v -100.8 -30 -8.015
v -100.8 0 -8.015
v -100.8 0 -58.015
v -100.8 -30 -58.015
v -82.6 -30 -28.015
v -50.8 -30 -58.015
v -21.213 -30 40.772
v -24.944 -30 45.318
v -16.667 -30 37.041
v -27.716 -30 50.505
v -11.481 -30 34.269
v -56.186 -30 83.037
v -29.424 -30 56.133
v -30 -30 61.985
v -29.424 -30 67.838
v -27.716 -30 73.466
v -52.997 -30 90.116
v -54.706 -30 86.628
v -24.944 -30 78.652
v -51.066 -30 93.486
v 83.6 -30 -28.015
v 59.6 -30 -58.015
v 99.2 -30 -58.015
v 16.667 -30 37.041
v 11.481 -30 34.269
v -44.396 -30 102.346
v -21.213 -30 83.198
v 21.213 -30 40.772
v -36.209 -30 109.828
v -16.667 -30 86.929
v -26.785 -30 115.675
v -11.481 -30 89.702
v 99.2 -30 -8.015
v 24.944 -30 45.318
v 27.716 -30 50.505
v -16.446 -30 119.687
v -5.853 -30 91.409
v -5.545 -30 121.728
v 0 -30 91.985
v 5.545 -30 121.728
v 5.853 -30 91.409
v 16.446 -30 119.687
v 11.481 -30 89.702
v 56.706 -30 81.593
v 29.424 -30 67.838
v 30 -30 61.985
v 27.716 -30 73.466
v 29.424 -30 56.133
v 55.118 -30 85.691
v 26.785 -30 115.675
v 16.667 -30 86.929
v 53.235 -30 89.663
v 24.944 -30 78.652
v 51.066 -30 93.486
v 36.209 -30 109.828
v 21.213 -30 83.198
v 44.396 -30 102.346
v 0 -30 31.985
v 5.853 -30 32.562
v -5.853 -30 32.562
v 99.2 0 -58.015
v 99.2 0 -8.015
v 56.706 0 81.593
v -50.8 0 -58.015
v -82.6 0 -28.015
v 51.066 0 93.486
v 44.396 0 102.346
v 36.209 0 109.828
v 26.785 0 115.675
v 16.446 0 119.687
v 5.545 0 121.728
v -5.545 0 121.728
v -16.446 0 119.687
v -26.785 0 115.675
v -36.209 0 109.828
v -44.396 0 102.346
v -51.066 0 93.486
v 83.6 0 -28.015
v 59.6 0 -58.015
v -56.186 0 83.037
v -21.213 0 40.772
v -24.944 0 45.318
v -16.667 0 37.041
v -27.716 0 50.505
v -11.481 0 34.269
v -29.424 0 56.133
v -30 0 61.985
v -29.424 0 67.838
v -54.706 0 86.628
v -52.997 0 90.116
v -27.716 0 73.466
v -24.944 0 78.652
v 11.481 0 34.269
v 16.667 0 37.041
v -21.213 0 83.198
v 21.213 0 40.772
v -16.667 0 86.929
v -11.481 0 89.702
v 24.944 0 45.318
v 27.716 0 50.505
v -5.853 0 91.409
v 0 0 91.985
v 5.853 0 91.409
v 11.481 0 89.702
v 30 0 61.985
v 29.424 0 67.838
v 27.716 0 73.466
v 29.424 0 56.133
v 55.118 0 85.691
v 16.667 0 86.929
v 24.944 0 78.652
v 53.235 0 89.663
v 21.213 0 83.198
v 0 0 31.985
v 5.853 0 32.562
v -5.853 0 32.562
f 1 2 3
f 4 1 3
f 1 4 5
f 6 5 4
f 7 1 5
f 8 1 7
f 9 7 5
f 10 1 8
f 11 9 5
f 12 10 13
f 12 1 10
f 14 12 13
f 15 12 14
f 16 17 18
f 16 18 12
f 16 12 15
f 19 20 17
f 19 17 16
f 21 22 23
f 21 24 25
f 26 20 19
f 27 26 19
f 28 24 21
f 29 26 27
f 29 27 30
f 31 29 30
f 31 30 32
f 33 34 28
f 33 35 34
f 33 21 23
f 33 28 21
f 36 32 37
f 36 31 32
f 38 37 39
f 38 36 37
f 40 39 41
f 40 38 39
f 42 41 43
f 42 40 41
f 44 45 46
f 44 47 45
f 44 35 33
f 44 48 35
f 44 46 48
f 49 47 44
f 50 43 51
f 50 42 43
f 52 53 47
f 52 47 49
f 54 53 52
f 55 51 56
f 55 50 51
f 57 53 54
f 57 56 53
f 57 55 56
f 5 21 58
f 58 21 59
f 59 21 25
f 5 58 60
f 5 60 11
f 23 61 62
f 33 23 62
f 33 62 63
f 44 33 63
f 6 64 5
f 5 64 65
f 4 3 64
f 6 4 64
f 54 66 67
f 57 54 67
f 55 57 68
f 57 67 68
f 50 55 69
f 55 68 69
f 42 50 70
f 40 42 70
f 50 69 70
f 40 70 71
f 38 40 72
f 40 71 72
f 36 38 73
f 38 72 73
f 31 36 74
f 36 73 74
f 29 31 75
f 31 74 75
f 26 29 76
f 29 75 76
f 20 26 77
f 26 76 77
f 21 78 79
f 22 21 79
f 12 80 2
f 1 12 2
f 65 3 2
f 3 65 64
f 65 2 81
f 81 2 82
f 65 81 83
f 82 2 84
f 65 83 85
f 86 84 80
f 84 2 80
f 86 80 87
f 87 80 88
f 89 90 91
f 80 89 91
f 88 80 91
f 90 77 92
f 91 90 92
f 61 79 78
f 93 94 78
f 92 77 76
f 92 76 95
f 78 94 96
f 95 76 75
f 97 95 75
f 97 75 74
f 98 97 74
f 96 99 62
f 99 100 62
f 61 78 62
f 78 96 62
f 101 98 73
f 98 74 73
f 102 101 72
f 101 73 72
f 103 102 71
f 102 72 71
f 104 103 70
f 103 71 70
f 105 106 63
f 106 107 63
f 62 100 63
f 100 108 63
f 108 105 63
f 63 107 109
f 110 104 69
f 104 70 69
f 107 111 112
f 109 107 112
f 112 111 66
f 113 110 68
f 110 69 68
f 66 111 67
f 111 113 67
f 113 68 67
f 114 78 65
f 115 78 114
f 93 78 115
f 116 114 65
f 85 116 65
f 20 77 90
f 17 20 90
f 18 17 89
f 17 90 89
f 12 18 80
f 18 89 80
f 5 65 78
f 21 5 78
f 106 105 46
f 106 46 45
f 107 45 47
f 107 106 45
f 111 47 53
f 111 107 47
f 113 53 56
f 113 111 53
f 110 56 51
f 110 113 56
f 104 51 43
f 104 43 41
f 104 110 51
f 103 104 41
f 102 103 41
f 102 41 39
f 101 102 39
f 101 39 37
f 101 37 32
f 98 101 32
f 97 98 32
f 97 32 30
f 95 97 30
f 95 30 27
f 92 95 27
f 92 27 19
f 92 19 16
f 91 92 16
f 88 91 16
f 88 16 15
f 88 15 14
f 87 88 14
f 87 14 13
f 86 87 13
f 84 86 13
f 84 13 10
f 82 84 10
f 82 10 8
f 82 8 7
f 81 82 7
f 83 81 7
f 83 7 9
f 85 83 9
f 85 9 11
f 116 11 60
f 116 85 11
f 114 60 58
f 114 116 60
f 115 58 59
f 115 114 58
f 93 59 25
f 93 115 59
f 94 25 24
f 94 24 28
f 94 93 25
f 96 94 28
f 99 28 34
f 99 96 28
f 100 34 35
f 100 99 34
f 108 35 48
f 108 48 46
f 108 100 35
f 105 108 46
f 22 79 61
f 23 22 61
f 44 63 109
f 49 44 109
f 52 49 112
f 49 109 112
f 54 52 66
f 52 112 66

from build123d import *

# Parameters (mm, degrees)
F0_R     = 30
F1_DEPTH = 25
F2_DEPTH = 30


with BuildPart() as f1:
    # F0 (on Front) → F1 (new body)
    with BuildSketch(Plane.XZ):
        with BuildLine():
            Line((-56.185745, 83.036698), (-100.799982, -8.014716))
            Line((-100.799982, -8.014716), (99.200018, -8.014716))
            Line((99.200018, -8.014716), (56.705809, 81.592712))
            ThreePointArc((56.705809, 81.592712), (59.170721, 71.926398), (60, 61.985284))
            ThreePointArc((60, 61.985284), (-10.697086, 2.946548), (-56.185745, 83.036698))
        make_face()
        Polygon((99.200018, -8.014716), (-100.799982, -8.014716), (-100.799982, -58.014716), (-50.799982, -58.014716), (-82.59998, -28.014716), (83.600022, -28.014716), (59.600013, -58.014716), (99.200018, -58.014716), align=None)
        with BuildLine():
            Line((-51.065717, 93.48596), (-56.185745, 83.036698))
            ThreePointArc((-56.185745, 83.036698), (-10.697086, 2.946548), (60, 61.985284))
            ThreePointArc((60, 61.985284), (59.170721, 71.926398), (56.705809, 81.592712))
            Line((56.705809, 81.592712), (51.065717, 93.48596))
            ThreePointArc((51.065717, 93.48596), (0, 121.985284), (-51.065717, 93.48596))
        make_face()
        with Locations((0, 61.985284)):
            Circle(F0_R, mode=Mode.SUBTRACT)
        with BuildLine():
            ThreePointArc((-51.065717, 93.48596), (-53.879642, 88.385743), (-56.185745, 83.036698))
            Line((-56.185745, 83.036698), (-51.065717, 93.48596))
        make_face()
        with BuildLine():
            Line((51.065717, 93.48596), (56.705809, 81.592712))
            ThreePointArc((56.705809, 81.592712), (54.212893, 87.69447), (51.065717, 93.48596))
        make_face()
    extrude(amount=F1_DEPTH)

    # F0 (on Front) → F2 (join)
    with BuildSketch(Plane.XZ):
        with BuildLine():
            Line((-56.185745, 83.036698), (-100.799982, -8.014716))
            Line((-100.799982, -8.014716), (99.200018, -8.014716))
            Line((99.200018, -8.014716), (56.705809, 81.592712))
            ThreePointArc((56.705809, 81.592712), (59.170721, 71.926398), (60, 61.985284))
            ThreePointArc((60, 61.985284), (-10.697086, 2.946548), (-56.185745, 83.036698))
        make_face()
        Polygon((99.200018, -8.014716), (-100.799982, -8.014716), (-100.799982, -58.014716), (-50.799982, -58.014716), (-82.59998, -28.014716), (83.600022, -28.014716), (59.600013, -58.014716), (99.200018, -58.014716), align=None)
        with BuildLine():
            Line((-51.065717, 93.48596), (-56.185745, 83.036698))
            ThreePointArc((-56.185745, 83.036698), (-10.697086, 2.946548), (60, 61.985284))
            ThreePointArc((60, 61.985284), (59.170721, 71.926398), (56.705809, 81.592712))
            Line((56.705809, 81.592712), (51.065717, 93.48596))
            ThreePointArc((51.065717, 93.48596), (0, 121.985284), (-51.065717, 93.48596))
        make_face()
        with Locations((0, 61.985284)):
            Circle(F0_R, mode=Mode.SUBTRACT)
        with BuildLine():
            ThreePointArc((-51.065717, 93.48596), (-53.879642, 88.385743), (-56.185745, 83.036698))
            Line((-56.185745, 83.036698), (-51.065717, 93.48596))
        make_face()
        with BuildLine():
            Line((51.065717, 93.48596), (56.705809, 81.592712))
            ThreePointArc((56.705809, 81.592712), (54.212893, 87.69447), (51.065717, 93.48596))
        make_face()
    extrude(amount=F2_DEPTH)


solid = f1.part
